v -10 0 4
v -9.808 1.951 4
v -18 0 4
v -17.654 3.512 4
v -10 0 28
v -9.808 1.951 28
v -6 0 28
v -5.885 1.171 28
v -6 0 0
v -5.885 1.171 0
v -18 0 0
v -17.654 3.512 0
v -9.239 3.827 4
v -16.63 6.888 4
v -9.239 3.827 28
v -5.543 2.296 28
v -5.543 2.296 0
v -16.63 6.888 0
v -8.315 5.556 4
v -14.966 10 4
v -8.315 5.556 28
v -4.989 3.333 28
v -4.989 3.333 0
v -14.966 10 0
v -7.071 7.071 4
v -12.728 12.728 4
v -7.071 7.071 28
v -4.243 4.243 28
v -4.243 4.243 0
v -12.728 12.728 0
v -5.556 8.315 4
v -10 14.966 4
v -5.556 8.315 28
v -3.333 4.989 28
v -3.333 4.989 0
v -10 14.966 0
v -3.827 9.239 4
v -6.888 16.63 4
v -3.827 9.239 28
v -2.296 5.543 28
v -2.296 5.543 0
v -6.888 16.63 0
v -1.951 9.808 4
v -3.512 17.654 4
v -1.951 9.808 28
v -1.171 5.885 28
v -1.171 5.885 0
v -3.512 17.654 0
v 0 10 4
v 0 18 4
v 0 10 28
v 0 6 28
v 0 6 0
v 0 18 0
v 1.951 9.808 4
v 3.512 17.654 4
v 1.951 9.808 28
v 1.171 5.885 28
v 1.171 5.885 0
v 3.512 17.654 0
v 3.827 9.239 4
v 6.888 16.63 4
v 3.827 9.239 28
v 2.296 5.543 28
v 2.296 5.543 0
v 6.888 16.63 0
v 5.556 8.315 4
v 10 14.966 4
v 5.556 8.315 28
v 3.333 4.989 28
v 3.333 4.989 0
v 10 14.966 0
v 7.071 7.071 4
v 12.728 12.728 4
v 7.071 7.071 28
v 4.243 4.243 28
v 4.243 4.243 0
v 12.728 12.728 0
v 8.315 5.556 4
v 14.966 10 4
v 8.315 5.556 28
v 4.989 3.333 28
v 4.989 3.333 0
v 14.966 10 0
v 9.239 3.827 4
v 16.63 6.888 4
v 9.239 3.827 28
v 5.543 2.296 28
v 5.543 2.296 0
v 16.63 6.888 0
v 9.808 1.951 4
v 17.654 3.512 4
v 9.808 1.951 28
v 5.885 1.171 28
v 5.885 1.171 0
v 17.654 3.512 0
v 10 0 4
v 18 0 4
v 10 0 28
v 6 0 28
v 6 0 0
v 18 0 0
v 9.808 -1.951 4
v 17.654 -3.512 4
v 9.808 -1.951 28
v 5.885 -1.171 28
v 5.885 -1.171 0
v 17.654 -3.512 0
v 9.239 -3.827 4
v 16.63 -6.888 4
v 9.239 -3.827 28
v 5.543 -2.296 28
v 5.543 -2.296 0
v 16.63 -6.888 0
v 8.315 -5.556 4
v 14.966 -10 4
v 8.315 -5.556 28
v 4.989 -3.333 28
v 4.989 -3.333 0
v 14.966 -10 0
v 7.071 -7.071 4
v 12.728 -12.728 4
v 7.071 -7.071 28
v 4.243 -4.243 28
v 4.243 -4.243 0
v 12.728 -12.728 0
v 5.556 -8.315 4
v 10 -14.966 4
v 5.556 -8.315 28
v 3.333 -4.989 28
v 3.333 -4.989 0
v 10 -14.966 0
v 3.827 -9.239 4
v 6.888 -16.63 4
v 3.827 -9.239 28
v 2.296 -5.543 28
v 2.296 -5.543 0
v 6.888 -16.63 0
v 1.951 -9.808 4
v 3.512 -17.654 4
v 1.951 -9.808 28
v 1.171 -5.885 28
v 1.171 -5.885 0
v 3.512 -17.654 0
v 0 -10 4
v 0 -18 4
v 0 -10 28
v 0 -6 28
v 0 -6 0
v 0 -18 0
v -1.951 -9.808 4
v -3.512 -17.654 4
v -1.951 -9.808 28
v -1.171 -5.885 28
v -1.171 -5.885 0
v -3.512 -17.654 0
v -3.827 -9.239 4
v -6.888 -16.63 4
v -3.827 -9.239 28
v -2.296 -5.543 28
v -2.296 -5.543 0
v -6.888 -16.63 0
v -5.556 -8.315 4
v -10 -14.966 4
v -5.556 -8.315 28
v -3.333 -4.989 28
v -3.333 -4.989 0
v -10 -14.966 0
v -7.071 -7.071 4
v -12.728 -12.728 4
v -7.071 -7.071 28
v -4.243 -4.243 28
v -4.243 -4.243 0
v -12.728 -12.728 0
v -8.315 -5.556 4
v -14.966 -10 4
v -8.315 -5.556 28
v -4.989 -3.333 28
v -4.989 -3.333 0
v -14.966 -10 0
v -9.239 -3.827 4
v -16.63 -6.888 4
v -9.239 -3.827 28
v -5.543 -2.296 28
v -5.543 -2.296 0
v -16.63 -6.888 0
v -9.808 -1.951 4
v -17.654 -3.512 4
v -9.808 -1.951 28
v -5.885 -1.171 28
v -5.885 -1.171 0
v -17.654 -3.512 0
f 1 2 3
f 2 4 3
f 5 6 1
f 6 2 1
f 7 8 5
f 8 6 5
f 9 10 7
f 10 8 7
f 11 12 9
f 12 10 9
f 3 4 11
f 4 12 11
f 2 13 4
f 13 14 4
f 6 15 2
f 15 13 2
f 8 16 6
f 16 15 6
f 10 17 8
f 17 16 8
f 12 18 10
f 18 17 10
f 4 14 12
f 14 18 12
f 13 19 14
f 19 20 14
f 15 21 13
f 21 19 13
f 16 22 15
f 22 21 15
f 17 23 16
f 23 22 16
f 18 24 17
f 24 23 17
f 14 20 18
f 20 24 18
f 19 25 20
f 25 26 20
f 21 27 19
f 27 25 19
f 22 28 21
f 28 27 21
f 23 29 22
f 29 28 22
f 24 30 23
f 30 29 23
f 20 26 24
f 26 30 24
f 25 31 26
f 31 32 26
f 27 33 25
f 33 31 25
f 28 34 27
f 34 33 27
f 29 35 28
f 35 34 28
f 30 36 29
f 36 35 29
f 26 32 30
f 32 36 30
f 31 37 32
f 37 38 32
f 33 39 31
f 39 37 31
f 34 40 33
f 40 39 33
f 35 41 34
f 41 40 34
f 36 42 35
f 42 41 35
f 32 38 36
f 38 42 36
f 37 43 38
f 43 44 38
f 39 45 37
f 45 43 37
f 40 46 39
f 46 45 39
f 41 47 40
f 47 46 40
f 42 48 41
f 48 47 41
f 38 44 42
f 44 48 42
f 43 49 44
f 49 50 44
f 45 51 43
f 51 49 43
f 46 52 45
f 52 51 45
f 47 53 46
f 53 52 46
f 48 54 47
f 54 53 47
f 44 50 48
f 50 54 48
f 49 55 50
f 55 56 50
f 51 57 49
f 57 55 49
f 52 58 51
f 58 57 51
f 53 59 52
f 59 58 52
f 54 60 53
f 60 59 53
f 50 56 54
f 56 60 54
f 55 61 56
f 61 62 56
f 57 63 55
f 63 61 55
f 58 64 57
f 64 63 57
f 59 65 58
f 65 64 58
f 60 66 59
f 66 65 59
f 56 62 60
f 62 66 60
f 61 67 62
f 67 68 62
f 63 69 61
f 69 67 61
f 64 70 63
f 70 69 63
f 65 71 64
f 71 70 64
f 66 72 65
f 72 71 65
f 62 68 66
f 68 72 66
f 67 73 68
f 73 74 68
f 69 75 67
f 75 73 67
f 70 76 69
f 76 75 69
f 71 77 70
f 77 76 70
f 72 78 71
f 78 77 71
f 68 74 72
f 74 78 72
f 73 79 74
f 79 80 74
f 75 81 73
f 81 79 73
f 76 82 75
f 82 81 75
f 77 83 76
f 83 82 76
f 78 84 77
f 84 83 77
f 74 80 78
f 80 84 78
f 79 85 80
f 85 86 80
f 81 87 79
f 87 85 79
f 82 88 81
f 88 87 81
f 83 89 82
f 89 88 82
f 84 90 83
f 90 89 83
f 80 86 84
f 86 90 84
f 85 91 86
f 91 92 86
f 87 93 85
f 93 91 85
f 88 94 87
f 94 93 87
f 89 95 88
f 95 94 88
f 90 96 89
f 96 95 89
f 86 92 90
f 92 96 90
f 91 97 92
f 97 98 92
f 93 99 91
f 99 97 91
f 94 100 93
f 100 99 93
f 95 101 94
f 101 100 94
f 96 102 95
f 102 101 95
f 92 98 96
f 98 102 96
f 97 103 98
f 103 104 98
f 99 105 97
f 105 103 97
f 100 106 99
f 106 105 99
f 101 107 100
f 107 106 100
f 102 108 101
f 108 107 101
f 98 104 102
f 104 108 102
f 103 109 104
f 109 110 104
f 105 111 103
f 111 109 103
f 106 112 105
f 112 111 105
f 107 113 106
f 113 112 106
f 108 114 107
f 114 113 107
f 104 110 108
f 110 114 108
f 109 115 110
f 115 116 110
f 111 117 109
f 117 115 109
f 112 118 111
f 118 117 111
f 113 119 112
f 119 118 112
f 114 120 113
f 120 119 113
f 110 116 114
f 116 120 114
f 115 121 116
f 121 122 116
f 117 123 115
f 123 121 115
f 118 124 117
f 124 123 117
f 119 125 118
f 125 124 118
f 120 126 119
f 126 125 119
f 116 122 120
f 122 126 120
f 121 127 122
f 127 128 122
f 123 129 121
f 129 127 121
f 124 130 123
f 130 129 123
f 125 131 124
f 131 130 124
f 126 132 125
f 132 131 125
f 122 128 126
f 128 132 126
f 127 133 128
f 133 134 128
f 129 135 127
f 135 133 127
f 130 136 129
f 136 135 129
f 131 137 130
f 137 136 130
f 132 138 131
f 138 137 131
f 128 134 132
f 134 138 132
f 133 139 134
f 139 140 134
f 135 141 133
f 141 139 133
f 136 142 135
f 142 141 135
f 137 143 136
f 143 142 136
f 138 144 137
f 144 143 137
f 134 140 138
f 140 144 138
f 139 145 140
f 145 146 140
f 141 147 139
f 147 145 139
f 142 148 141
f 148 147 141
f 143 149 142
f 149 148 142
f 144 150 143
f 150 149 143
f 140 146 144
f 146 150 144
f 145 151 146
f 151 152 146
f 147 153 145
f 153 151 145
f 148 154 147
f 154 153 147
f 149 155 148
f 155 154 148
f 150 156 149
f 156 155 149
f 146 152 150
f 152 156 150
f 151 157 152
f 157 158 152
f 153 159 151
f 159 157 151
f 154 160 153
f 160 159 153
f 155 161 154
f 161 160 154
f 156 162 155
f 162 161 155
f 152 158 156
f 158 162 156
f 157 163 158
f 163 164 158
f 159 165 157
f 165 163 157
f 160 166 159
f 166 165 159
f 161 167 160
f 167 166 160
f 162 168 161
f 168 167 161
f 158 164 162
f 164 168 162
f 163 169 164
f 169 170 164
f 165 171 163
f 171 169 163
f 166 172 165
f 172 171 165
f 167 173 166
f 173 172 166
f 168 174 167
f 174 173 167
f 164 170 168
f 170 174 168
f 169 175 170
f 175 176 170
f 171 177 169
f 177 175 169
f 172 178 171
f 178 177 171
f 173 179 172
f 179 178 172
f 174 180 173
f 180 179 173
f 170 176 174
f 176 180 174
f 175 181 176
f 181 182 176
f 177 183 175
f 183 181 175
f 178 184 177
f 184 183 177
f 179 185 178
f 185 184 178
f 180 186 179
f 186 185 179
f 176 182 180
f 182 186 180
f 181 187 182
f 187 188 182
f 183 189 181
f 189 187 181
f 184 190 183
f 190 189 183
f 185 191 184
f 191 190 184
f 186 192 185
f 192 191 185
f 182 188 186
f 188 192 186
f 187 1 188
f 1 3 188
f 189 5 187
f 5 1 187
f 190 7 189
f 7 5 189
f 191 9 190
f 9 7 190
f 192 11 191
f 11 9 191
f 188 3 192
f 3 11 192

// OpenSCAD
$fn = 32;

// ----------------------------------------------------------------------
// Revolved part: flanged bushing R18
// ----------------------------------------------------------------------

// --- parameters (mm) ---
bore_r = 6;               // bore radius
flange_r = 18;            // flange radius
flange_h = 4;             // flange thickness
sleeve_r = 10;            // sleeve radius
total_h = 28;             // overall height
revolve_angle = 360;      // revolve sweep, degrees

bore_d = 2 * bore_r;
flange_d = 2 * flange_r;
sleeve_d = 2 * sleeve_r;

profile = [[6, 0], [18, 0], [18, 4], [10, 4], [10, 28], [6, 28]];  // primary outline, 6 points, counter clockwise

// --- the one profile operation ---
rotate_extrude(angle = revolve_angle) polygon(points = profile);
